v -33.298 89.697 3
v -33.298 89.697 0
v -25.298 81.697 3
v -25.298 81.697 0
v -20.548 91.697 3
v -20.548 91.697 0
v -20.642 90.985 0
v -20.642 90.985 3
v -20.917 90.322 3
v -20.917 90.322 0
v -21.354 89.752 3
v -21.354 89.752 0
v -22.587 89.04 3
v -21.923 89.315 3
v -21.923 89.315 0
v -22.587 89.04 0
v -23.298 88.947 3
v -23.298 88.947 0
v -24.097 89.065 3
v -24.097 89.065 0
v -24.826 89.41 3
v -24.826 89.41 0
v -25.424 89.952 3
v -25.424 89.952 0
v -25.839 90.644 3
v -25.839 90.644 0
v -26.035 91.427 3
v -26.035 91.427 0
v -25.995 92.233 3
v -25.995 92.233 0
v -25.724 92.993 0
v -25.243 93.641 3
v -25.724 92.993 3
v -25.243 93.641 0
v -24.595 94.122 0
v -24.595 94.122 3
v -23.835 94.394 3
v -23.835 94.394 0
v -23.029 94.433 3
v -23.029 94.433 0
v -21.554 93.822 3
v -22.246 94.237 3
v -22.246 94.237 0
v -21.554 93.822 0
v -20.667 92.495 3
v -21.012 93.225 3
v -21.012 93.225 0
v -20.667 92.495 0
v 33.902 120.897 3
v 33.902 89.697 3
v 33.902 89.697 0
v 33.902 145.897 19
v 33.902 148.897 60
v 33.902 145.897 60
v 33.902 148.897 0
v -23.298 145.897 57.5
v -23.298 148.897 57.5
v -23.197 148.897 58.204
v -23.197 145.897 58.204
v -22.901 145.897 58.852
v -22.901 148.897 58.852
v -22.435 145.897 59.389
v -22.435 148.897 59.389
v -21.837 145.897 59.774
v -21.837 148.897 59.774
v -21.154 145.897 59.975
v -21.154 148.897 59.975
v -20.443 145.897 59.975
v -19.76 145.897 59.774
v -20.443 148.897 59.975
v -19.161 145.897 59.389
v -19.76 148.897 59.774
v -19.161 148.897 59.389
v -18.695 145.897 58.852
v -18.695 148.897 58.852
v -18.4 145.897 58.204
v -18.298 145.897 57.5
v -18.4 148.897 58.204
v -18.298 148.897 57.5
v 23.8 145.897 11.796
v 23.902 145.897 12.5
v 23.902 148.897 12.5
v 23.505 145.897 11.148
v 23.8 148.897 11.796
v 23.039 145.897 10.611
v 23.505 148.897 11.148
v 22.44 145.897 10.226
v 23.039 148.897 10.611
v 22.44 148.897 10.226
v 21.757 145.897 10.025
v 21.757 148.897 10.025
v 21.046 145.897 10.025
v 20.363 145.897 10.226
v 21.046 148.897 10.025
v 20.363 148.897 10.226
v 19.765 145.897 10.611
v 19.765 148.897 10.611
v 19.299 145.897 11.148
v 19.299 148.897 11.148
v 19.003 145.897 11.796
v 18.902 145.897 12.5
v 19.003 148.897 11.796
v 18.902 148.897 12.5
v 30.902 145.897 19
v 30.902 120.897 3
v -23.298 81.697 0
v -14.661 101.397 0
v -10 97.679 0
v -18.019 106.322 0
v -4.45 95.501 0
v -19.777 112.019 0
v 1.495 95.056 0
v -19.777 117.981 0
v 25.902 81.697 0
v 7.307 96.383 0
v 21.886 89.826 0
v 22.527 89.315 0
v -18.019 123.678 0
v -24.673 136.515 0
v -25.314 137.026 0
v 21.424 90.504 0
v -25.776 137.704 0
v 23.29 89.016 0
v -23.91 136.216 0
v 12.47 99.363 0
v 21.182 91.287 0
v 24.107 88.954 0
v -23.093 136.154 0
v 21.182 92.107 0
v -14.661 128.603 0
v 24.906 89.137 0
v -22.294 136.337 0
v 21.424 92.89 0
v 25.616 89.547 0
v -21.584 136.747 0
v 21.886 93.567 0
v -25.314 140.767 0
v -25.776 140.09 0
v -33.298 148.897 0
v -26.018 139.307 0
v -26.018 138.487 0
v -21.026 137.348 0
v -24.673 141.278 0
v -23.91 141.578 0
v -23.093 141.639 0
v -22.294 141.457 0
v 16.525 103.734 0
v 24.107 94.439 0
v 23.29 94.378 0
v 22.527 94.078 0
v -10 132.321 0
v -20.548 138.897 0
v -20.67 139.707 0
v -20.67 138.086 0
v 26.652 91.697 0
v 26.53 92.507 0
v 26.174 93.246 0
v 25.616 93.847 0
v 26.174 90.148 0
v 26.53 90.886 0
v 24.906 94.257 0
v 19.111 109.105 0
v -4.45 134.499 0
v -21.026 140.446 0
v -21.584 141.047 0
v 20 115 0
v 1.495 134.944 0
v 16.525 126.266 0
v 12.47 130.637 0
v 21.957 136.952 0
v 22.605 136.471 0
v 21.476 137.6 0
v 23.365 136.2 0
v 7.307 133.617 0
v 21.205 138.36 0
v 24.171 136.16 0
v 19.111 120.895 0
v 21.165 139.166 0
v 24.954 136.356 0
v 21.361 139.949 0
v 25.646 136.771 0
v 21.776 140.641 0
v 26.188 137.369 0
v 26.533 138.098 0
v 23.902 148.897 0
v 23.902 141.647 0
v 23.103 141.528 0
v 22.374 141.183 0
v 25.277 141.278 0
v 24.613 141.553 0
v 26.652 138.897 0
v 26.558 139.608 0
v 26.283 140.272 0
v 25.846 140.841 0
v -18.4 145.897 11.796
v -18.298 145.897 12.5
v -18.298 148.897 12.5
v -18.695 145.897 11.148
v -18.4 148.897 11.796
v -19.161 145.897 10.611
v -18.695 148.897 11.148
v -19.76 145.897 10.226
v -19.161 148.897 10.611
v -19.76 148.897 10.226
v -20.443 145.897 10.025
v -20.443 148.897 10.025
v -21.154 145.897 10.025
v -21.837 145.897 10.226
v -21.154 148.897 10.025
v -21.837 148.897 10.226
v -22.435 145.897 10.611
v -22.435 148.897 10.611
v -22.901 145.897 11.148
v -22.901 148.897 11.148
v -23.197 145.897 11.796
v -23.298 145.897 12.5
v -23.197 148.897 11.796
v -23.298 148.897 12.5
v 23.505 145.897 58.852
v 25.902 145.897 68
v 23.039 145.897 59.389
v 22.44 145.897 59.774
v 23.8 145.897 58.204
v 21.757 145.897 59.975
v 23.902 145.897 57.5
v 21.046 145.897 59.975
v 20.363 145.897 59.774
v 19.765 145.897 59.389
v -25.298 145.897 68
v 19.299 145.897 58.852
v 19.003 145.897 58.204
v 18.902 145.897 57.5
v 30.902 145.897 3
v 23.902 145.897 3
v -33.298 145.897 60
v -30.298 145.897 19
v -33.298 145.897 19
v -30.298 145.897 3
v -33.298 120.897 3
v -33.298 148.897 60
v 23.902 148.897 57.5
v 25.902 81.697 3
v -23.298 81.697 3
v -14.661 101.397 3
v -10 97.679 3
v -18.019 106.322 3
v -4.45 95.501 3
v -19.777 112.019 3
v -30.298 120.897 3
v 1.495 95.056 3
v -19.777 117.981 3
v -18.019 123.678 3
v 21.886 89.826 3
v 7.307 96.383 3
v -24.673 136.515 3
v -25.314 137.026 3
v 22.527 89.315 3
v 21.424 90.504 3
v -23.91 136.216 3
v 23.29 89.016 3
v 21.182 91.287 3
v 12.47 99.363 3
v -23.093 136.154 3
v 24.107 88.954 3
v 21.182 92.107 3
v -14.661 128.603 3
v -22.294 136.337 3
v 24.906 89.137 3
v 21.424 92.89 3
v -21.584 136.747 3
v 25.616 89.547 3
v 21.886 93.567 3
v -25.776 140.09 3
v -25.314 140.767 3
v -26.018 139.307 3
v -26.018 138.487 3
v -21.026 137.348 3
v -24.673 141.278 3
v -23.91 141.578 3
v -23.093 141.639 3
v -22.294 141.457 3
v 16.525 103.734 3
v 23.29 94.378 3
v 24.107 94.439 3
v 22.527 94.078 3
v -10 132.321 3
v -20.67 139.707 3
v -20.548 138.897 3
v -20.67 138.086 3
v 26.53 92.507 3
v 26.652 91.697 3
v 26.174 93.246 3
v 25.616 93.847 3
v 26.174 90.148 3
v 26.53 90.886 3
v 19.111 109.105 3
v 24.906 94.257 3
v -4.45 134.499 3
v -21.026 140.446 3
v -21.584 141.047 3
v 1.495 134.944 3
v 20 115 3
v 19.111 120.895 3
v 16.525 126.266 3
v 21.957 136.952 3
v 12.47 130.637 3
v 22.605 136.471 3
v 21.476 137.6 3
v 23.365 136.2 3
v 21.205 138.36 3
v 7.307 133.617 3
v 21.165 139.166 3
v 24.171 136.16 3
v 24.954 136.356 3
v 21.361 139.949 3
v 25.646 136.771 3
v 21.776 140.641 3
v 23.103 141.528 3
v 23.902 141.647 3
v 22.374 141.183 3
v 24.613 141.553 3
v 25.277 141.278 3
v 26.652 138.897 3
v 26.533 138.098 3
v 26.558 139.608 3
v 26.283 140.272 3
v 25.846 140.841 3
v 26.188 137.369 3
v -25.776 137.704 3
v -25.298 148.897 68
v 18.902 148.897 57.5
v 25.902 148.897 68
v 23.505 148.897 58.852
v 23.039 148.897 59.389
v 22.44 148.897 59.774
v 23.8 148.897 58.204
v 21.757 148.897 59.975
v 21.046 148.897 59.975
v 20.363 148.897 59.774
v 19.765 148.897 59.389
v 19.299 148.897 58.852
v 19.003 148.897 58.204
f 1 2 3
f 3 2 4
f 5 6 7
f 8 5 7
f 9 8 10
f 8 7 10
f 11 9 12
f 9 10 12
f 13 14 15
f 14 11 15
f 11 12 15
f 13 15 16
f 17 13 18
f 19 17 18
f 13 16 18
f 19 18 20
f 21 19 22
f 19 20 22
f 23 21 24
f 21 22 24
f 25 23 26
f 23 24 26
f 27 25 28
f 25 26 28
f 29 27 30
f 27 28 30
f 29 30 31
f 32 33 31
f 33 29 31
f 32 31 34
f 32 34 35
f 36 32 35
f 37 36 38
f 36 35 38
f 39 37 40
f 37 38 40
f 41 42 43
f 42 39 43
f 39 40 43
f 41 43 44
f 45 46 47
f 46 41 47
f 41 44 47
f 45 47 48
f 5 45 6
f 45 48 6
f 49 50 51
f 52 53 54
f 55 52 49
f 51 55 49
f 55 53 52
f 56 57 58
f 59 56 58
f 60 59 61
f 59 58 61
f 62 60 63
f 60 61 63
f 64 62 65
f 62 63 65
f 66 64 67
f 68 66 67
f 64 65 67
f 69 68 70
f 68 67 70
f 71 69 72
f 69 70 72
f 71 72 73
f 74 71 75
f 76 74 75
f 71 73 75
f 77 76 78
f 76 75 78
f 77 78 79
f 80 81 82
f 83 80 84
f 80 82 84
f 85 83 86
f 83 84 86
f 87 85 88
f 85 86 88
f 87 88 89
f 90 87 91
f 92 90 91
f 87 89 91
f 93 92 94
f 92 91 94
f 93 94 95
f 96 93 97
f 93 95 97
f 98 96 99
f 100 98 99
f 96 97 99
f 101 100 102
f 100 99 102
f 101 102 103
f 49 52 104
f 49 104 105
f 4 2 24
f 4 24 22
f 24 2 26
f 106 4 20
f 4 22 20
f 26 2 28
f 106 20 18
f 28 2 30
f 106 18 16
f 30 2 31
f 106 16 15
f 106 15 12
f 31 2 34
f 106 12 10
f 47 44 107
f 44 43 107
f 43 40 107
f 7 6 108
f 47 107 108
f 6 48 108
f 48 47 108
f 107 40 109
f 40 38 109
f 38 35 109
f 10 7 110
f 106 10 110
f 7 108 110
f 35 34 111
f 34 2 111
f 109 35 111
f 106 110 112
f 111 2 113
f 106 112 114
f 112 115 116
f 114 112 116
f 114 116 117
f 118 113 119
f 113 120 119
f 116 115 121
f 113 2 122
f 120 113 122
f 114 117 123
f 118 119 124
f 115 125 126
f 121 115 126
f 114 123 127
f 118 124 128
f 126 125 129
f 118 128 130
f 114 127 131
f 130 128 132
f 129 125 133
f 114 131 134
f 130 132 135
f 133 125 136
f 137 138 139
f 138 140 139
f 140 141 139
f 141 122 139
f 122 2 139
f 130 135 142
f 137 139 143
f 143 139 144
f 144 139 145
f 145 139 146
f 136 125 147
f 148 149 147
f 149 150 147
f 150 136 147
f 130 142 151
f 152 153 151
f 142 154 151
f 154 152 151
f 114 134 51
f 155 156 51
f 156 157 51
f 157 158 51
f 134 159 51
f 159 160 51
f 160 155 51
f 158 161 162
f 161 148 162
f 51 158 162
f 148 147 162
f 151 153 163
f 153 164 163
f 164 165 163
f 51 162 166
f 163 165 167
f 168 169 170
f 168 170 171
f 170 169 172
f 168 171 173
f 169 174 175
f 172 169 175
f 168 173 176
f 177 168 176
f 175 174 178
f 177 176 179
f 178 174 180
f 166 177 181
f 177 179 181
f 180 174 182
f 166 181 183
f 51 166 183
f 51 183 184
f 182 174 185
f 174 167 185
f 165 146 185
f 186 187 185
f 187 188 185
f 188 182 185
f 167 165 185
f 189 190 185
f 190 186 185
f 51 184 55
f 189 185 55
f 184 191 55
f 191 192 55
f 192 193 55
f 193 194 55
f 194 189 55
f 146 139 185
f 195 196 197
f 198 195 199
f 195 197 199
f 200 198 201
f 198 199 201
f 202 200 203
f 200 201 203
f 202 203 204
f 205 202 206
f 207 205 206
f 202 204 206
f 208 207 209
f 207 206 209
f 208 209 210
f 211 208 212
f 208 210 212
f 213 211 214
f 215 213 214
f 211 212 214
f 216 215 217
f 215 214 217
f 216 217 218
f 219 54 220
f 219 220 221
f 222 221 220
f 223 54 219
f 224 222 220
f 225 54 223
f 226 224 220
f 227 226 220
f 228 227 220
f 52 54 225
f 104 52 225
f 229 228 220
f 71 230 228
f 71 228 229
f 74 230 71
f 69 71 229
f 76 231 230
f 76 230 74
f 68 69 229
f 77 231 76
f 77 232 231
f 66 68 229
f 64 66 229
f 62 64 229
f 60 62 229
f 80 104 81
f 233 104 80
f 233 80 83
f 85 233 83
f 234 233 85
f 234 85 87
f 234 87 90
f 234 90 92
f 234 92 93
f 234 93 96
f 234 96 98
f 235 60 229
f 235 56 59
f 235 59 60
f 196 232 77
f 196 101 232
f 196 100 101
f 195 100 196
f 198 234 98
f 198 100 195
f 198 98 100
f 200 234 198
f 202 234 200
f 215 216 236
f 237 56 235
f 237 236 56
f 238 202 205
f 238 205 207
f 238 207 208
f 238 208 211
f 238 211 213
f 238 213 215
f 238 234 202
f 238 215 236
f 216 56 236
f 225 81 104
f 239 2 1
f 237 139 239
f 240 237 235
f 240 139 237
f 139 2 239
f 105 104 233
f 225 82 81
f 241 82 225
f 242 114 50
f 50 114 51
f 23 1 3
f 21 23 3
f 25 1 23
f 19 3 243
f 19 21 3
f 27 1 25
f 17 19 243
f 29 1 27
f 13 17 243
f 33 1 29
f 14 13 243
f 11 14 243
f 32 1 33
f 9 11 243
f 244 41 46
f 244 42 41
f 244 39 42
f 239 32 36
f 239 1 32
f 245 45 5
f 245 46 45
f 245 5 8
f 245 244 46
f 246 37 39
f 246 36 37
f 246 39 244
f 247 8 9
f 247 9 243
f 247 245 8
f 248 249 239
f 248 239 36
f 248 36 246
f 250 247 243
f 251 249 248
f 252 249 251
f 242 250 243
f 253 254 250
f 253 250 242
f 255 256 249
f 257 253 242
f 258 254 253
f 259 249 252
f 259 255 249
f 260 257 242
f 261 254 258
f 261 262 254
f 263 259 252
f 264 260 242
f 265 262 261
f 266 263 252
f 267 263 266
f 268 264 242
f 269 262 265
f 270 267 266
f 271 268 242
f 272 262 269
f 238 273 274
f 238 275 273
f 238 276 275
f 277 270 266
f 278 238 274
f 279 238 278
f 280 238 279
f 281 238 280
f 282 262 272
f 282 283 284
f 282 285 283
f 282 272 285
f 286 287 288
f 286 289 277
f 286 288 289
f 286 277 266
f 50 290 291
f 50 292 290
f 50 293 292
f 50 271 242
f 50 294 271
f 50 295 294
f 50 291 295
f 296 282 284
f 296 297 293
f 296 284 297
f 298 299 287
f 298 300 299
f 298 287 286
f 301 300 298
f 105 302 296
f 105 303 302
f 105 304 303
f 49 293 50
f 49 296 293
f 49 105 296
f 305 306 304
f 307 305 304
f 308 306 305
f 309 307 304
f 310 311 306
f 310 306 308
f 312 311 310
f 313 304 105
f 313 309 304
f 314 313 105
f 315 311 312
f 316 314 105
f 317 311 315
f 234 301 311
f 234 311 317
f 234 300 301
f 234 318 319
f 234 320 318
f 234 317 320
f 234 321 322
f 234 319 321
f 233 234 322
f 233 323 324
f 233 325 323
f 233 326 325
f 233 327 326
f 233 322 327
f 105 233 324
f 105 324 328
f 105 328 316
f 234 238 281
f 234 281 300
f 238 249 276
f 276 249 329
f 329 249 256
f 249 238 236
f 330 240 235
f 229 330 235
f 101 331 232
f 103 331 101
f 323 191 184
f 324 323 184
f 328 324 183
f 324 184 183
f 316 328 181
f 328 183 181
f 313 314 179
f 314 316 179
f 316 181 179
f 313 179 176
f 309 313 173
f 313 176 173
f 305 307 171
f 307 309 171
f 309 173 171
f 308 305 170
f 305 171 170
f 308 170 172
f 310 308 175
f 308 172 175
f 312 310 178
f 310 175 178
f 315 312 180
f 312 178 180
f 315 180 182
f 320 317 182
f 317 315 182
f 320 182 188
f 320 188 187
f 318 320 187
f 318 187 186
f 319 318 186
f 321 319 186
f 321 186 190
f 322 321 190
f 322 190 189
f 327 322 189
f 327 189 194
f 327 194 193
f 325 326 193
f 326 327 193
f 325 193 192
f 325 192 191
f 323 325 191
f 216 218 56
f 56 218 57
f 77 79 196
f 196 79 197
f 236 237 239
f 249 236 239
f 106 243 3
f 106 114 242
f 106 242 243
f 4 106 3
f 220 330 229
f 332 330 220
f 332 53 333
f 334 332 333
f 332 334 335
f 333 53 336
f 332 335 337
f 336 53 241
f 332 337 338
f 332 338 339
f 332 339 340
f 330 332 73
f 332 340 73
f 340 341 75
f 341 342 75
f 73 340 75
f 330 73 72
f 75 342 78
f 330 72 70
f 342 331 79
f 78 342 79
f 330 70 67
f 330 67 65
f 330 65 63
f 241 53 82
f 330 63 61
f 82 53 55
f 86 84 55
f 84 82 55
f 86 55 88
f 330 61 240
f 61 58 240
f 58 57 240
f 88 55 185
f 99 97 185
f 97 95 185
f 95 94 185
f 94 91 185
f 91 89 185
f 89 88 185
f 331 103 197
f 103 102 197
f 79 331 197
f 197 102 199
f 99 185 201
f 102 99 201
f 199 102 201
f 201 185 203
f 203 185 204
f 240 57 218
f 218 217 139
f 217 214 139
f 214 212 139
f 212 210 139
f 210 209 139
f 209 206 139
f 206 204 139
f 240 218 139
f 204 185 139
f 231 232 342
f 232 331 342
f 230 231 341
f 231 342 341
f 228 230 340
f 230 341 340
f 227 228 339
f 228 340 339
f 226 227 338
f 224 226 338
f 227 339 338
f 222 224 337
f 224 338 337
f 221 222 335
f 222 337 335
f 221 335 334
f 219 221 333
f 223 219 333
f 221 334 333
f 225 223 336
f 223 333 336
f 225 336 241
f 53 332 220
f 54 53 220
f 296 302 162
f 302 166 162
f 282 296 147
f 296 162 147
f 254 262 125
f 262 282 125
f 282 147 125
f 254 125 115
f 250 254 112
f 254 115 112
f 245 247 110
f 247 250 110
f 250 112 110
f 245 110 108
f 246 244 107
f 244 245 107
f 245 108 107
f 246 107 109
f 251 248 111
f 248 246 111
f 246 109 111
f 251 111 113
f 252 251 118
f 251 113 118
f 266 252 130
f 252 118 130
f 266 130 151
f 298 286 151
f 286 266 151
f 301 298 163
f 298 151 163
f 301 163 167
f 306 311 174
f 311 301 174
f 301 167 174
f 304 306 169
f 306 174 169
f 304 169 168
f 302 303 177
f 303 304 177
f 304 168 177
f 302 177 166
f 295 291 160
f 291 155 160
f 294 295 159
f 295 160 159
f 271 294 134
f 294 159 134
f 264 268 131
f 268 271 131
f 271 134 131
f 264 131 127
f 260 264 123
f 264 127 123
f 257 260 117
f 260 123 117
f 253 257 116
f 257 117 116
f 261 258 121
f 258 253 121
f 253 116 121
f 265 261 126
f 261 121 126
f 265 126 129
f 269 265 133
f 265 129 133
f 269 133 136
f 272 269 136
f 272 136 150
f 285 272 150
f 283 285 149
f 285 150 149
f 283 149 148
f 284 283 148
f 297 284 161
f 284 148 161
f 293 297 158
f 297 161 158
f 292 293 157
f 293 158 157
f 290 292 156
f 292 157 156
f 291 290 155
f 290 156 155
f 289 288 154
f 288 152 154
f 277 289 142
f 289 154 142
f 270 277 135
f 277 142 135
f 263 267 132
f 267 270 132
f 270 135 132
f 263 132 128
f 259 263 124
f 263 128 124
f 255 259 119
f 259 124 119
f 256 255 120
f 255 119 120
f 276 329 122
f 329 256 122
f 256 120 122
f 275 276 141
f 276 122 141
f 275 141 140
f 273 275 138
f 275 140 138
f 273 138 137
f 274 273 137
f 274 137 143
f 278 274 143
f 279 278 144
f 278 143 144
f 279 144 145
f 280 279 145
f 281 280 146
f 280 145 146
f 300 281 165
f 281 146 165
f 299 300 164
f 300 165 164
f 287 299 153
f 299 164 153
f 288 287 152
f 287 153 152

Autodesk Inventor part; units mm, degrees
ref_plane "YZ Plane" through (0, 0, 0) normal (1, 0, 0) x (0, 1, 0)
ref_plane "XZ Plane" through (0, 0, 0) normal (0, 1, 0) x (-1, 0, 0)
ref_plane "XY Plane" through (0, 0, 0) normal (0, 0, 1) x (1, 0, 0)
sketch "Sketch1" plane through (0, 0, 0) normal (0, 0, 1) x (1, 0, 0)
  circle A0 centre (-23.2983, 91.6967) radius 2.75
  circle A1 centre (0, 115) radius 20
  circle A2 centre (23.9017, 91.6967) radius 2.75
  circle A3 centre (23.9017, 138.8967) radius 2.75
  circle A4 centre (-23.2983, 138.8967) radius 2.75
  line L0 (-23.2983, 91.6967) -> (-23.2983, 81.6967)
  line L1 (-23.2983, 81.6967) -> (-33.2983, 81.6967)
  line L2 (23.9017, 138.8967) -> (23.9017, 148.8967)
  line L3 (23.9017, 148.8967) -> (33.9017, 148.8967)
  line L4 (-25.2983, 81.6967) -> (25.9017, 81.6967)
  line L5 (33.9017, 89.6967) -> (33.9017, 148.8967)
  line L6 (33.9017, 148.8967) -> (-33.2983, 148.8967)
  line L7 (-33.2983, 148.8967) -> (-33.2983, 89.6967)
  line L8 (-33.2983, 89.6967) -> (-25.2983, 81.6967)
  line L9 (25.9017, 81.6967) -> (33.9017, 89.6967)
  point P0 (0, 0)
  point P1 (33.9017, 81.6967)
  dimension "d0" = 10
  dimension "d1" = 10
  dimension "d2" = 10
  dimension "d3" = 10
  dimension "d4" = 8
  dimension "d5" = 8
  dimension "d6" = 8
  dimension "d7" = 8
extrude "Extrusion1" add sketch "Sketch1" along normal blind 3
sketch "Sketch2" plane through (0, 0, 3) normal (0, 0, 1) x (1, 0, 0)
  line L0 (33.9017, 148.8967) -> (-33.2983, 148.8967) projected
  line L1 (33.9017, 89.6967) -> (33.9017, 148.8967) projected
  line L2 (-33.2983, 148.8967) -> (33.9017, 148.8967)
  line L3 (33.9017, 148.8967) -> (33.9017, 145.8967)
  line L4 (33.9017, 145.8967) -> (-33.2983, 145.8967)
  line L5 (-33.2983, 145.8967) -> (-33.2983, 148.8967)
  point P0 (0, 0)
  dimension "d10" = 3
extrude "Extrusion2" add sketch "Sketch2" along normal blind 65
chamfer "Chamfer1" distance 8 angle 45 1 edges at (33.9017, 147.3967, 68)
chamfer "Chamfer2" distance 8 angle 45 1 edges at (-33.2983, 147.3967, 68)
sketch "Sketch3" plane through (-33.2983, 89.6967, 0) normal (-1, 0, 0) x (0, 0, 1)
  line L0 (3, 56.2) -> (60, 56.2) projected
  line L1 (3, 56.2) -> (3, 31.2)
  line L2 (3, 56.2) -> (3, 0) projected
  line L3 (3, 56.2) -> (19, 56.2)
  line L4 (19, 56.2) -> (3, 31.2)
  point P0 (0, -89.6967)
  dimension "d19" = 25
  dimension "d20" = 16
extrude "Extrusion3" add sketch "Sketch3" against normal blind 3
sketch "Sketch4" plane through (33.9017, 89.6967, 0) normal (1, 0, 0) x (0, 0, -1)
  line L0 (-19, 56.2) -> (-3, 56.2) projected
  line L1 (-19, 56.2) -> (-3, 31.2) projected
  line L2 (-3, 56.2) -> (-3, 31.2) projected
  point P0 (0, -89.6967)
extrude "Extrusion4" add sketch "Sketch4" against normal blind 3
sketch "Sketch5" plane through (-33.2983, 148.8967, 0) normal (0, 1, 0) x (1, 0, 0)
  line L0 (67.2, 0) -> (67.2, -60) projected
  line L1 (67.2, -60) -> (57.2, -60)
  line L2 (54.7, -60) -> (54.7, -60)
  line L3 (52.2, -57.5) -> (52.2, -12.5)
  line L4 (54.7, -10) -> (54.7, -10)
  line L5 (57.2, -12.5) -> (57.2, -57.5)
  line L6 (0, -19) -> (0, -60) projected
  line L7 (0, -60) -> (10, -60)
  line L8 (12.5, -60) -> (12.5, -60)
  line L9 (15, -57.5) -> (15, -12.5)
  line L10 (12.5, -10) -> (12.5, -10)
  line L11 (10, -12.5) -> (10, -57.5)
  arc A0 (12.5, -10) -> (10, -12.5) centre (12.5, -12.5) ccw
  arc A1 (15, -12.5) -> (12.5, -10) centre (12.5, -12.5) ccw
  arc A2 (12.5, -60) -> (15, -57.5) centre (12.5, -57.5) ccw
  arc A3 (10, -57.5) -> (12.5, -60) centre (12.5, -57.5) ccw
  arc A4 (52.2, -57.5) -> (54.7, -60) centre (54.7, -57.5) ccw
  arc A5 (54.7, -60) -> (57.2, -57.5) centre (54.7, -57.5) ccw
  arc A6 (57.2, -12.5) -> (54.7, -10) centre (54.7, -12.5) ccw
  arc A7 (54.7, -10) -> (52.2, -12.5) centre (54.7, -12.5) ccw
  point P0 (33.2983, 0)
  point P1 (52.2, -10)
  point P2 (52.2, -60)
  point P3 (57.2, -10)
  point P4 (15, -10)
  point P5 (10, -10)
  dimension "d25" = 10
  dimension "d26" = 5
  dimension "d27" = 50
  dimension "d28" = 10
  dimension "d29" = 5
  dimension "d30" = 2.5
extrude "Extrusion5" cut sketch "Sketch5" against normal through all
sketch "Sketch7" plane through (0, 0, 3) normal (0, 0, 1) x (1, 0, 0)
  line L0 (30.9017, 120.8967) -> (30.9017, 145.8967) projected
  line L1 (30.9017, 145.8967) -> (-30.2983, 145.8967) projected
  line L2 (-30.2983, 145.8967) -> (-30.2983, 120.8967) projected
  line L3 (-30.2983, 120.8967) -> (-33.2983, 120.8967) projected
  line L4 (-33.2983, 120.8967) -> (-33.2983, 89.6967) projected
  line L5 (-33.2983, 89.6967) -> (-25.2983, 81.6967) projected
  line L6 (-25.2983, 81.6967) -> (25.9017, 81.6967) projected
  line L7 (25.9017, 81.6967) -> (33.9017, 89.6967) projected
  line L8 (33.9017, 89.6967) -> (33.9017, 120.8967) projected
  line L9 (33.9017, 120.8967) -> (30.9017, 120.8967) projected
  circle A0 centre (0, 115) radius 20 projected
  circle A1 centre (-23.2983, 138.8967) radius 2.75 projected
  circle A2 centre (23.9017, 91.6967) radius 2.75 projected
  circle A3 centre (23.9017, 138.8967) radius 2.75 projected
  circle A4 centre (-23.2983, 91.6967) radius 2.75 projected
  point P0 (0, 0)
equation "\"d5\" = d4"
equation "\"d6\" = d4"
equation "\"d7\" = d6"
properties part number "afirma_motor"
